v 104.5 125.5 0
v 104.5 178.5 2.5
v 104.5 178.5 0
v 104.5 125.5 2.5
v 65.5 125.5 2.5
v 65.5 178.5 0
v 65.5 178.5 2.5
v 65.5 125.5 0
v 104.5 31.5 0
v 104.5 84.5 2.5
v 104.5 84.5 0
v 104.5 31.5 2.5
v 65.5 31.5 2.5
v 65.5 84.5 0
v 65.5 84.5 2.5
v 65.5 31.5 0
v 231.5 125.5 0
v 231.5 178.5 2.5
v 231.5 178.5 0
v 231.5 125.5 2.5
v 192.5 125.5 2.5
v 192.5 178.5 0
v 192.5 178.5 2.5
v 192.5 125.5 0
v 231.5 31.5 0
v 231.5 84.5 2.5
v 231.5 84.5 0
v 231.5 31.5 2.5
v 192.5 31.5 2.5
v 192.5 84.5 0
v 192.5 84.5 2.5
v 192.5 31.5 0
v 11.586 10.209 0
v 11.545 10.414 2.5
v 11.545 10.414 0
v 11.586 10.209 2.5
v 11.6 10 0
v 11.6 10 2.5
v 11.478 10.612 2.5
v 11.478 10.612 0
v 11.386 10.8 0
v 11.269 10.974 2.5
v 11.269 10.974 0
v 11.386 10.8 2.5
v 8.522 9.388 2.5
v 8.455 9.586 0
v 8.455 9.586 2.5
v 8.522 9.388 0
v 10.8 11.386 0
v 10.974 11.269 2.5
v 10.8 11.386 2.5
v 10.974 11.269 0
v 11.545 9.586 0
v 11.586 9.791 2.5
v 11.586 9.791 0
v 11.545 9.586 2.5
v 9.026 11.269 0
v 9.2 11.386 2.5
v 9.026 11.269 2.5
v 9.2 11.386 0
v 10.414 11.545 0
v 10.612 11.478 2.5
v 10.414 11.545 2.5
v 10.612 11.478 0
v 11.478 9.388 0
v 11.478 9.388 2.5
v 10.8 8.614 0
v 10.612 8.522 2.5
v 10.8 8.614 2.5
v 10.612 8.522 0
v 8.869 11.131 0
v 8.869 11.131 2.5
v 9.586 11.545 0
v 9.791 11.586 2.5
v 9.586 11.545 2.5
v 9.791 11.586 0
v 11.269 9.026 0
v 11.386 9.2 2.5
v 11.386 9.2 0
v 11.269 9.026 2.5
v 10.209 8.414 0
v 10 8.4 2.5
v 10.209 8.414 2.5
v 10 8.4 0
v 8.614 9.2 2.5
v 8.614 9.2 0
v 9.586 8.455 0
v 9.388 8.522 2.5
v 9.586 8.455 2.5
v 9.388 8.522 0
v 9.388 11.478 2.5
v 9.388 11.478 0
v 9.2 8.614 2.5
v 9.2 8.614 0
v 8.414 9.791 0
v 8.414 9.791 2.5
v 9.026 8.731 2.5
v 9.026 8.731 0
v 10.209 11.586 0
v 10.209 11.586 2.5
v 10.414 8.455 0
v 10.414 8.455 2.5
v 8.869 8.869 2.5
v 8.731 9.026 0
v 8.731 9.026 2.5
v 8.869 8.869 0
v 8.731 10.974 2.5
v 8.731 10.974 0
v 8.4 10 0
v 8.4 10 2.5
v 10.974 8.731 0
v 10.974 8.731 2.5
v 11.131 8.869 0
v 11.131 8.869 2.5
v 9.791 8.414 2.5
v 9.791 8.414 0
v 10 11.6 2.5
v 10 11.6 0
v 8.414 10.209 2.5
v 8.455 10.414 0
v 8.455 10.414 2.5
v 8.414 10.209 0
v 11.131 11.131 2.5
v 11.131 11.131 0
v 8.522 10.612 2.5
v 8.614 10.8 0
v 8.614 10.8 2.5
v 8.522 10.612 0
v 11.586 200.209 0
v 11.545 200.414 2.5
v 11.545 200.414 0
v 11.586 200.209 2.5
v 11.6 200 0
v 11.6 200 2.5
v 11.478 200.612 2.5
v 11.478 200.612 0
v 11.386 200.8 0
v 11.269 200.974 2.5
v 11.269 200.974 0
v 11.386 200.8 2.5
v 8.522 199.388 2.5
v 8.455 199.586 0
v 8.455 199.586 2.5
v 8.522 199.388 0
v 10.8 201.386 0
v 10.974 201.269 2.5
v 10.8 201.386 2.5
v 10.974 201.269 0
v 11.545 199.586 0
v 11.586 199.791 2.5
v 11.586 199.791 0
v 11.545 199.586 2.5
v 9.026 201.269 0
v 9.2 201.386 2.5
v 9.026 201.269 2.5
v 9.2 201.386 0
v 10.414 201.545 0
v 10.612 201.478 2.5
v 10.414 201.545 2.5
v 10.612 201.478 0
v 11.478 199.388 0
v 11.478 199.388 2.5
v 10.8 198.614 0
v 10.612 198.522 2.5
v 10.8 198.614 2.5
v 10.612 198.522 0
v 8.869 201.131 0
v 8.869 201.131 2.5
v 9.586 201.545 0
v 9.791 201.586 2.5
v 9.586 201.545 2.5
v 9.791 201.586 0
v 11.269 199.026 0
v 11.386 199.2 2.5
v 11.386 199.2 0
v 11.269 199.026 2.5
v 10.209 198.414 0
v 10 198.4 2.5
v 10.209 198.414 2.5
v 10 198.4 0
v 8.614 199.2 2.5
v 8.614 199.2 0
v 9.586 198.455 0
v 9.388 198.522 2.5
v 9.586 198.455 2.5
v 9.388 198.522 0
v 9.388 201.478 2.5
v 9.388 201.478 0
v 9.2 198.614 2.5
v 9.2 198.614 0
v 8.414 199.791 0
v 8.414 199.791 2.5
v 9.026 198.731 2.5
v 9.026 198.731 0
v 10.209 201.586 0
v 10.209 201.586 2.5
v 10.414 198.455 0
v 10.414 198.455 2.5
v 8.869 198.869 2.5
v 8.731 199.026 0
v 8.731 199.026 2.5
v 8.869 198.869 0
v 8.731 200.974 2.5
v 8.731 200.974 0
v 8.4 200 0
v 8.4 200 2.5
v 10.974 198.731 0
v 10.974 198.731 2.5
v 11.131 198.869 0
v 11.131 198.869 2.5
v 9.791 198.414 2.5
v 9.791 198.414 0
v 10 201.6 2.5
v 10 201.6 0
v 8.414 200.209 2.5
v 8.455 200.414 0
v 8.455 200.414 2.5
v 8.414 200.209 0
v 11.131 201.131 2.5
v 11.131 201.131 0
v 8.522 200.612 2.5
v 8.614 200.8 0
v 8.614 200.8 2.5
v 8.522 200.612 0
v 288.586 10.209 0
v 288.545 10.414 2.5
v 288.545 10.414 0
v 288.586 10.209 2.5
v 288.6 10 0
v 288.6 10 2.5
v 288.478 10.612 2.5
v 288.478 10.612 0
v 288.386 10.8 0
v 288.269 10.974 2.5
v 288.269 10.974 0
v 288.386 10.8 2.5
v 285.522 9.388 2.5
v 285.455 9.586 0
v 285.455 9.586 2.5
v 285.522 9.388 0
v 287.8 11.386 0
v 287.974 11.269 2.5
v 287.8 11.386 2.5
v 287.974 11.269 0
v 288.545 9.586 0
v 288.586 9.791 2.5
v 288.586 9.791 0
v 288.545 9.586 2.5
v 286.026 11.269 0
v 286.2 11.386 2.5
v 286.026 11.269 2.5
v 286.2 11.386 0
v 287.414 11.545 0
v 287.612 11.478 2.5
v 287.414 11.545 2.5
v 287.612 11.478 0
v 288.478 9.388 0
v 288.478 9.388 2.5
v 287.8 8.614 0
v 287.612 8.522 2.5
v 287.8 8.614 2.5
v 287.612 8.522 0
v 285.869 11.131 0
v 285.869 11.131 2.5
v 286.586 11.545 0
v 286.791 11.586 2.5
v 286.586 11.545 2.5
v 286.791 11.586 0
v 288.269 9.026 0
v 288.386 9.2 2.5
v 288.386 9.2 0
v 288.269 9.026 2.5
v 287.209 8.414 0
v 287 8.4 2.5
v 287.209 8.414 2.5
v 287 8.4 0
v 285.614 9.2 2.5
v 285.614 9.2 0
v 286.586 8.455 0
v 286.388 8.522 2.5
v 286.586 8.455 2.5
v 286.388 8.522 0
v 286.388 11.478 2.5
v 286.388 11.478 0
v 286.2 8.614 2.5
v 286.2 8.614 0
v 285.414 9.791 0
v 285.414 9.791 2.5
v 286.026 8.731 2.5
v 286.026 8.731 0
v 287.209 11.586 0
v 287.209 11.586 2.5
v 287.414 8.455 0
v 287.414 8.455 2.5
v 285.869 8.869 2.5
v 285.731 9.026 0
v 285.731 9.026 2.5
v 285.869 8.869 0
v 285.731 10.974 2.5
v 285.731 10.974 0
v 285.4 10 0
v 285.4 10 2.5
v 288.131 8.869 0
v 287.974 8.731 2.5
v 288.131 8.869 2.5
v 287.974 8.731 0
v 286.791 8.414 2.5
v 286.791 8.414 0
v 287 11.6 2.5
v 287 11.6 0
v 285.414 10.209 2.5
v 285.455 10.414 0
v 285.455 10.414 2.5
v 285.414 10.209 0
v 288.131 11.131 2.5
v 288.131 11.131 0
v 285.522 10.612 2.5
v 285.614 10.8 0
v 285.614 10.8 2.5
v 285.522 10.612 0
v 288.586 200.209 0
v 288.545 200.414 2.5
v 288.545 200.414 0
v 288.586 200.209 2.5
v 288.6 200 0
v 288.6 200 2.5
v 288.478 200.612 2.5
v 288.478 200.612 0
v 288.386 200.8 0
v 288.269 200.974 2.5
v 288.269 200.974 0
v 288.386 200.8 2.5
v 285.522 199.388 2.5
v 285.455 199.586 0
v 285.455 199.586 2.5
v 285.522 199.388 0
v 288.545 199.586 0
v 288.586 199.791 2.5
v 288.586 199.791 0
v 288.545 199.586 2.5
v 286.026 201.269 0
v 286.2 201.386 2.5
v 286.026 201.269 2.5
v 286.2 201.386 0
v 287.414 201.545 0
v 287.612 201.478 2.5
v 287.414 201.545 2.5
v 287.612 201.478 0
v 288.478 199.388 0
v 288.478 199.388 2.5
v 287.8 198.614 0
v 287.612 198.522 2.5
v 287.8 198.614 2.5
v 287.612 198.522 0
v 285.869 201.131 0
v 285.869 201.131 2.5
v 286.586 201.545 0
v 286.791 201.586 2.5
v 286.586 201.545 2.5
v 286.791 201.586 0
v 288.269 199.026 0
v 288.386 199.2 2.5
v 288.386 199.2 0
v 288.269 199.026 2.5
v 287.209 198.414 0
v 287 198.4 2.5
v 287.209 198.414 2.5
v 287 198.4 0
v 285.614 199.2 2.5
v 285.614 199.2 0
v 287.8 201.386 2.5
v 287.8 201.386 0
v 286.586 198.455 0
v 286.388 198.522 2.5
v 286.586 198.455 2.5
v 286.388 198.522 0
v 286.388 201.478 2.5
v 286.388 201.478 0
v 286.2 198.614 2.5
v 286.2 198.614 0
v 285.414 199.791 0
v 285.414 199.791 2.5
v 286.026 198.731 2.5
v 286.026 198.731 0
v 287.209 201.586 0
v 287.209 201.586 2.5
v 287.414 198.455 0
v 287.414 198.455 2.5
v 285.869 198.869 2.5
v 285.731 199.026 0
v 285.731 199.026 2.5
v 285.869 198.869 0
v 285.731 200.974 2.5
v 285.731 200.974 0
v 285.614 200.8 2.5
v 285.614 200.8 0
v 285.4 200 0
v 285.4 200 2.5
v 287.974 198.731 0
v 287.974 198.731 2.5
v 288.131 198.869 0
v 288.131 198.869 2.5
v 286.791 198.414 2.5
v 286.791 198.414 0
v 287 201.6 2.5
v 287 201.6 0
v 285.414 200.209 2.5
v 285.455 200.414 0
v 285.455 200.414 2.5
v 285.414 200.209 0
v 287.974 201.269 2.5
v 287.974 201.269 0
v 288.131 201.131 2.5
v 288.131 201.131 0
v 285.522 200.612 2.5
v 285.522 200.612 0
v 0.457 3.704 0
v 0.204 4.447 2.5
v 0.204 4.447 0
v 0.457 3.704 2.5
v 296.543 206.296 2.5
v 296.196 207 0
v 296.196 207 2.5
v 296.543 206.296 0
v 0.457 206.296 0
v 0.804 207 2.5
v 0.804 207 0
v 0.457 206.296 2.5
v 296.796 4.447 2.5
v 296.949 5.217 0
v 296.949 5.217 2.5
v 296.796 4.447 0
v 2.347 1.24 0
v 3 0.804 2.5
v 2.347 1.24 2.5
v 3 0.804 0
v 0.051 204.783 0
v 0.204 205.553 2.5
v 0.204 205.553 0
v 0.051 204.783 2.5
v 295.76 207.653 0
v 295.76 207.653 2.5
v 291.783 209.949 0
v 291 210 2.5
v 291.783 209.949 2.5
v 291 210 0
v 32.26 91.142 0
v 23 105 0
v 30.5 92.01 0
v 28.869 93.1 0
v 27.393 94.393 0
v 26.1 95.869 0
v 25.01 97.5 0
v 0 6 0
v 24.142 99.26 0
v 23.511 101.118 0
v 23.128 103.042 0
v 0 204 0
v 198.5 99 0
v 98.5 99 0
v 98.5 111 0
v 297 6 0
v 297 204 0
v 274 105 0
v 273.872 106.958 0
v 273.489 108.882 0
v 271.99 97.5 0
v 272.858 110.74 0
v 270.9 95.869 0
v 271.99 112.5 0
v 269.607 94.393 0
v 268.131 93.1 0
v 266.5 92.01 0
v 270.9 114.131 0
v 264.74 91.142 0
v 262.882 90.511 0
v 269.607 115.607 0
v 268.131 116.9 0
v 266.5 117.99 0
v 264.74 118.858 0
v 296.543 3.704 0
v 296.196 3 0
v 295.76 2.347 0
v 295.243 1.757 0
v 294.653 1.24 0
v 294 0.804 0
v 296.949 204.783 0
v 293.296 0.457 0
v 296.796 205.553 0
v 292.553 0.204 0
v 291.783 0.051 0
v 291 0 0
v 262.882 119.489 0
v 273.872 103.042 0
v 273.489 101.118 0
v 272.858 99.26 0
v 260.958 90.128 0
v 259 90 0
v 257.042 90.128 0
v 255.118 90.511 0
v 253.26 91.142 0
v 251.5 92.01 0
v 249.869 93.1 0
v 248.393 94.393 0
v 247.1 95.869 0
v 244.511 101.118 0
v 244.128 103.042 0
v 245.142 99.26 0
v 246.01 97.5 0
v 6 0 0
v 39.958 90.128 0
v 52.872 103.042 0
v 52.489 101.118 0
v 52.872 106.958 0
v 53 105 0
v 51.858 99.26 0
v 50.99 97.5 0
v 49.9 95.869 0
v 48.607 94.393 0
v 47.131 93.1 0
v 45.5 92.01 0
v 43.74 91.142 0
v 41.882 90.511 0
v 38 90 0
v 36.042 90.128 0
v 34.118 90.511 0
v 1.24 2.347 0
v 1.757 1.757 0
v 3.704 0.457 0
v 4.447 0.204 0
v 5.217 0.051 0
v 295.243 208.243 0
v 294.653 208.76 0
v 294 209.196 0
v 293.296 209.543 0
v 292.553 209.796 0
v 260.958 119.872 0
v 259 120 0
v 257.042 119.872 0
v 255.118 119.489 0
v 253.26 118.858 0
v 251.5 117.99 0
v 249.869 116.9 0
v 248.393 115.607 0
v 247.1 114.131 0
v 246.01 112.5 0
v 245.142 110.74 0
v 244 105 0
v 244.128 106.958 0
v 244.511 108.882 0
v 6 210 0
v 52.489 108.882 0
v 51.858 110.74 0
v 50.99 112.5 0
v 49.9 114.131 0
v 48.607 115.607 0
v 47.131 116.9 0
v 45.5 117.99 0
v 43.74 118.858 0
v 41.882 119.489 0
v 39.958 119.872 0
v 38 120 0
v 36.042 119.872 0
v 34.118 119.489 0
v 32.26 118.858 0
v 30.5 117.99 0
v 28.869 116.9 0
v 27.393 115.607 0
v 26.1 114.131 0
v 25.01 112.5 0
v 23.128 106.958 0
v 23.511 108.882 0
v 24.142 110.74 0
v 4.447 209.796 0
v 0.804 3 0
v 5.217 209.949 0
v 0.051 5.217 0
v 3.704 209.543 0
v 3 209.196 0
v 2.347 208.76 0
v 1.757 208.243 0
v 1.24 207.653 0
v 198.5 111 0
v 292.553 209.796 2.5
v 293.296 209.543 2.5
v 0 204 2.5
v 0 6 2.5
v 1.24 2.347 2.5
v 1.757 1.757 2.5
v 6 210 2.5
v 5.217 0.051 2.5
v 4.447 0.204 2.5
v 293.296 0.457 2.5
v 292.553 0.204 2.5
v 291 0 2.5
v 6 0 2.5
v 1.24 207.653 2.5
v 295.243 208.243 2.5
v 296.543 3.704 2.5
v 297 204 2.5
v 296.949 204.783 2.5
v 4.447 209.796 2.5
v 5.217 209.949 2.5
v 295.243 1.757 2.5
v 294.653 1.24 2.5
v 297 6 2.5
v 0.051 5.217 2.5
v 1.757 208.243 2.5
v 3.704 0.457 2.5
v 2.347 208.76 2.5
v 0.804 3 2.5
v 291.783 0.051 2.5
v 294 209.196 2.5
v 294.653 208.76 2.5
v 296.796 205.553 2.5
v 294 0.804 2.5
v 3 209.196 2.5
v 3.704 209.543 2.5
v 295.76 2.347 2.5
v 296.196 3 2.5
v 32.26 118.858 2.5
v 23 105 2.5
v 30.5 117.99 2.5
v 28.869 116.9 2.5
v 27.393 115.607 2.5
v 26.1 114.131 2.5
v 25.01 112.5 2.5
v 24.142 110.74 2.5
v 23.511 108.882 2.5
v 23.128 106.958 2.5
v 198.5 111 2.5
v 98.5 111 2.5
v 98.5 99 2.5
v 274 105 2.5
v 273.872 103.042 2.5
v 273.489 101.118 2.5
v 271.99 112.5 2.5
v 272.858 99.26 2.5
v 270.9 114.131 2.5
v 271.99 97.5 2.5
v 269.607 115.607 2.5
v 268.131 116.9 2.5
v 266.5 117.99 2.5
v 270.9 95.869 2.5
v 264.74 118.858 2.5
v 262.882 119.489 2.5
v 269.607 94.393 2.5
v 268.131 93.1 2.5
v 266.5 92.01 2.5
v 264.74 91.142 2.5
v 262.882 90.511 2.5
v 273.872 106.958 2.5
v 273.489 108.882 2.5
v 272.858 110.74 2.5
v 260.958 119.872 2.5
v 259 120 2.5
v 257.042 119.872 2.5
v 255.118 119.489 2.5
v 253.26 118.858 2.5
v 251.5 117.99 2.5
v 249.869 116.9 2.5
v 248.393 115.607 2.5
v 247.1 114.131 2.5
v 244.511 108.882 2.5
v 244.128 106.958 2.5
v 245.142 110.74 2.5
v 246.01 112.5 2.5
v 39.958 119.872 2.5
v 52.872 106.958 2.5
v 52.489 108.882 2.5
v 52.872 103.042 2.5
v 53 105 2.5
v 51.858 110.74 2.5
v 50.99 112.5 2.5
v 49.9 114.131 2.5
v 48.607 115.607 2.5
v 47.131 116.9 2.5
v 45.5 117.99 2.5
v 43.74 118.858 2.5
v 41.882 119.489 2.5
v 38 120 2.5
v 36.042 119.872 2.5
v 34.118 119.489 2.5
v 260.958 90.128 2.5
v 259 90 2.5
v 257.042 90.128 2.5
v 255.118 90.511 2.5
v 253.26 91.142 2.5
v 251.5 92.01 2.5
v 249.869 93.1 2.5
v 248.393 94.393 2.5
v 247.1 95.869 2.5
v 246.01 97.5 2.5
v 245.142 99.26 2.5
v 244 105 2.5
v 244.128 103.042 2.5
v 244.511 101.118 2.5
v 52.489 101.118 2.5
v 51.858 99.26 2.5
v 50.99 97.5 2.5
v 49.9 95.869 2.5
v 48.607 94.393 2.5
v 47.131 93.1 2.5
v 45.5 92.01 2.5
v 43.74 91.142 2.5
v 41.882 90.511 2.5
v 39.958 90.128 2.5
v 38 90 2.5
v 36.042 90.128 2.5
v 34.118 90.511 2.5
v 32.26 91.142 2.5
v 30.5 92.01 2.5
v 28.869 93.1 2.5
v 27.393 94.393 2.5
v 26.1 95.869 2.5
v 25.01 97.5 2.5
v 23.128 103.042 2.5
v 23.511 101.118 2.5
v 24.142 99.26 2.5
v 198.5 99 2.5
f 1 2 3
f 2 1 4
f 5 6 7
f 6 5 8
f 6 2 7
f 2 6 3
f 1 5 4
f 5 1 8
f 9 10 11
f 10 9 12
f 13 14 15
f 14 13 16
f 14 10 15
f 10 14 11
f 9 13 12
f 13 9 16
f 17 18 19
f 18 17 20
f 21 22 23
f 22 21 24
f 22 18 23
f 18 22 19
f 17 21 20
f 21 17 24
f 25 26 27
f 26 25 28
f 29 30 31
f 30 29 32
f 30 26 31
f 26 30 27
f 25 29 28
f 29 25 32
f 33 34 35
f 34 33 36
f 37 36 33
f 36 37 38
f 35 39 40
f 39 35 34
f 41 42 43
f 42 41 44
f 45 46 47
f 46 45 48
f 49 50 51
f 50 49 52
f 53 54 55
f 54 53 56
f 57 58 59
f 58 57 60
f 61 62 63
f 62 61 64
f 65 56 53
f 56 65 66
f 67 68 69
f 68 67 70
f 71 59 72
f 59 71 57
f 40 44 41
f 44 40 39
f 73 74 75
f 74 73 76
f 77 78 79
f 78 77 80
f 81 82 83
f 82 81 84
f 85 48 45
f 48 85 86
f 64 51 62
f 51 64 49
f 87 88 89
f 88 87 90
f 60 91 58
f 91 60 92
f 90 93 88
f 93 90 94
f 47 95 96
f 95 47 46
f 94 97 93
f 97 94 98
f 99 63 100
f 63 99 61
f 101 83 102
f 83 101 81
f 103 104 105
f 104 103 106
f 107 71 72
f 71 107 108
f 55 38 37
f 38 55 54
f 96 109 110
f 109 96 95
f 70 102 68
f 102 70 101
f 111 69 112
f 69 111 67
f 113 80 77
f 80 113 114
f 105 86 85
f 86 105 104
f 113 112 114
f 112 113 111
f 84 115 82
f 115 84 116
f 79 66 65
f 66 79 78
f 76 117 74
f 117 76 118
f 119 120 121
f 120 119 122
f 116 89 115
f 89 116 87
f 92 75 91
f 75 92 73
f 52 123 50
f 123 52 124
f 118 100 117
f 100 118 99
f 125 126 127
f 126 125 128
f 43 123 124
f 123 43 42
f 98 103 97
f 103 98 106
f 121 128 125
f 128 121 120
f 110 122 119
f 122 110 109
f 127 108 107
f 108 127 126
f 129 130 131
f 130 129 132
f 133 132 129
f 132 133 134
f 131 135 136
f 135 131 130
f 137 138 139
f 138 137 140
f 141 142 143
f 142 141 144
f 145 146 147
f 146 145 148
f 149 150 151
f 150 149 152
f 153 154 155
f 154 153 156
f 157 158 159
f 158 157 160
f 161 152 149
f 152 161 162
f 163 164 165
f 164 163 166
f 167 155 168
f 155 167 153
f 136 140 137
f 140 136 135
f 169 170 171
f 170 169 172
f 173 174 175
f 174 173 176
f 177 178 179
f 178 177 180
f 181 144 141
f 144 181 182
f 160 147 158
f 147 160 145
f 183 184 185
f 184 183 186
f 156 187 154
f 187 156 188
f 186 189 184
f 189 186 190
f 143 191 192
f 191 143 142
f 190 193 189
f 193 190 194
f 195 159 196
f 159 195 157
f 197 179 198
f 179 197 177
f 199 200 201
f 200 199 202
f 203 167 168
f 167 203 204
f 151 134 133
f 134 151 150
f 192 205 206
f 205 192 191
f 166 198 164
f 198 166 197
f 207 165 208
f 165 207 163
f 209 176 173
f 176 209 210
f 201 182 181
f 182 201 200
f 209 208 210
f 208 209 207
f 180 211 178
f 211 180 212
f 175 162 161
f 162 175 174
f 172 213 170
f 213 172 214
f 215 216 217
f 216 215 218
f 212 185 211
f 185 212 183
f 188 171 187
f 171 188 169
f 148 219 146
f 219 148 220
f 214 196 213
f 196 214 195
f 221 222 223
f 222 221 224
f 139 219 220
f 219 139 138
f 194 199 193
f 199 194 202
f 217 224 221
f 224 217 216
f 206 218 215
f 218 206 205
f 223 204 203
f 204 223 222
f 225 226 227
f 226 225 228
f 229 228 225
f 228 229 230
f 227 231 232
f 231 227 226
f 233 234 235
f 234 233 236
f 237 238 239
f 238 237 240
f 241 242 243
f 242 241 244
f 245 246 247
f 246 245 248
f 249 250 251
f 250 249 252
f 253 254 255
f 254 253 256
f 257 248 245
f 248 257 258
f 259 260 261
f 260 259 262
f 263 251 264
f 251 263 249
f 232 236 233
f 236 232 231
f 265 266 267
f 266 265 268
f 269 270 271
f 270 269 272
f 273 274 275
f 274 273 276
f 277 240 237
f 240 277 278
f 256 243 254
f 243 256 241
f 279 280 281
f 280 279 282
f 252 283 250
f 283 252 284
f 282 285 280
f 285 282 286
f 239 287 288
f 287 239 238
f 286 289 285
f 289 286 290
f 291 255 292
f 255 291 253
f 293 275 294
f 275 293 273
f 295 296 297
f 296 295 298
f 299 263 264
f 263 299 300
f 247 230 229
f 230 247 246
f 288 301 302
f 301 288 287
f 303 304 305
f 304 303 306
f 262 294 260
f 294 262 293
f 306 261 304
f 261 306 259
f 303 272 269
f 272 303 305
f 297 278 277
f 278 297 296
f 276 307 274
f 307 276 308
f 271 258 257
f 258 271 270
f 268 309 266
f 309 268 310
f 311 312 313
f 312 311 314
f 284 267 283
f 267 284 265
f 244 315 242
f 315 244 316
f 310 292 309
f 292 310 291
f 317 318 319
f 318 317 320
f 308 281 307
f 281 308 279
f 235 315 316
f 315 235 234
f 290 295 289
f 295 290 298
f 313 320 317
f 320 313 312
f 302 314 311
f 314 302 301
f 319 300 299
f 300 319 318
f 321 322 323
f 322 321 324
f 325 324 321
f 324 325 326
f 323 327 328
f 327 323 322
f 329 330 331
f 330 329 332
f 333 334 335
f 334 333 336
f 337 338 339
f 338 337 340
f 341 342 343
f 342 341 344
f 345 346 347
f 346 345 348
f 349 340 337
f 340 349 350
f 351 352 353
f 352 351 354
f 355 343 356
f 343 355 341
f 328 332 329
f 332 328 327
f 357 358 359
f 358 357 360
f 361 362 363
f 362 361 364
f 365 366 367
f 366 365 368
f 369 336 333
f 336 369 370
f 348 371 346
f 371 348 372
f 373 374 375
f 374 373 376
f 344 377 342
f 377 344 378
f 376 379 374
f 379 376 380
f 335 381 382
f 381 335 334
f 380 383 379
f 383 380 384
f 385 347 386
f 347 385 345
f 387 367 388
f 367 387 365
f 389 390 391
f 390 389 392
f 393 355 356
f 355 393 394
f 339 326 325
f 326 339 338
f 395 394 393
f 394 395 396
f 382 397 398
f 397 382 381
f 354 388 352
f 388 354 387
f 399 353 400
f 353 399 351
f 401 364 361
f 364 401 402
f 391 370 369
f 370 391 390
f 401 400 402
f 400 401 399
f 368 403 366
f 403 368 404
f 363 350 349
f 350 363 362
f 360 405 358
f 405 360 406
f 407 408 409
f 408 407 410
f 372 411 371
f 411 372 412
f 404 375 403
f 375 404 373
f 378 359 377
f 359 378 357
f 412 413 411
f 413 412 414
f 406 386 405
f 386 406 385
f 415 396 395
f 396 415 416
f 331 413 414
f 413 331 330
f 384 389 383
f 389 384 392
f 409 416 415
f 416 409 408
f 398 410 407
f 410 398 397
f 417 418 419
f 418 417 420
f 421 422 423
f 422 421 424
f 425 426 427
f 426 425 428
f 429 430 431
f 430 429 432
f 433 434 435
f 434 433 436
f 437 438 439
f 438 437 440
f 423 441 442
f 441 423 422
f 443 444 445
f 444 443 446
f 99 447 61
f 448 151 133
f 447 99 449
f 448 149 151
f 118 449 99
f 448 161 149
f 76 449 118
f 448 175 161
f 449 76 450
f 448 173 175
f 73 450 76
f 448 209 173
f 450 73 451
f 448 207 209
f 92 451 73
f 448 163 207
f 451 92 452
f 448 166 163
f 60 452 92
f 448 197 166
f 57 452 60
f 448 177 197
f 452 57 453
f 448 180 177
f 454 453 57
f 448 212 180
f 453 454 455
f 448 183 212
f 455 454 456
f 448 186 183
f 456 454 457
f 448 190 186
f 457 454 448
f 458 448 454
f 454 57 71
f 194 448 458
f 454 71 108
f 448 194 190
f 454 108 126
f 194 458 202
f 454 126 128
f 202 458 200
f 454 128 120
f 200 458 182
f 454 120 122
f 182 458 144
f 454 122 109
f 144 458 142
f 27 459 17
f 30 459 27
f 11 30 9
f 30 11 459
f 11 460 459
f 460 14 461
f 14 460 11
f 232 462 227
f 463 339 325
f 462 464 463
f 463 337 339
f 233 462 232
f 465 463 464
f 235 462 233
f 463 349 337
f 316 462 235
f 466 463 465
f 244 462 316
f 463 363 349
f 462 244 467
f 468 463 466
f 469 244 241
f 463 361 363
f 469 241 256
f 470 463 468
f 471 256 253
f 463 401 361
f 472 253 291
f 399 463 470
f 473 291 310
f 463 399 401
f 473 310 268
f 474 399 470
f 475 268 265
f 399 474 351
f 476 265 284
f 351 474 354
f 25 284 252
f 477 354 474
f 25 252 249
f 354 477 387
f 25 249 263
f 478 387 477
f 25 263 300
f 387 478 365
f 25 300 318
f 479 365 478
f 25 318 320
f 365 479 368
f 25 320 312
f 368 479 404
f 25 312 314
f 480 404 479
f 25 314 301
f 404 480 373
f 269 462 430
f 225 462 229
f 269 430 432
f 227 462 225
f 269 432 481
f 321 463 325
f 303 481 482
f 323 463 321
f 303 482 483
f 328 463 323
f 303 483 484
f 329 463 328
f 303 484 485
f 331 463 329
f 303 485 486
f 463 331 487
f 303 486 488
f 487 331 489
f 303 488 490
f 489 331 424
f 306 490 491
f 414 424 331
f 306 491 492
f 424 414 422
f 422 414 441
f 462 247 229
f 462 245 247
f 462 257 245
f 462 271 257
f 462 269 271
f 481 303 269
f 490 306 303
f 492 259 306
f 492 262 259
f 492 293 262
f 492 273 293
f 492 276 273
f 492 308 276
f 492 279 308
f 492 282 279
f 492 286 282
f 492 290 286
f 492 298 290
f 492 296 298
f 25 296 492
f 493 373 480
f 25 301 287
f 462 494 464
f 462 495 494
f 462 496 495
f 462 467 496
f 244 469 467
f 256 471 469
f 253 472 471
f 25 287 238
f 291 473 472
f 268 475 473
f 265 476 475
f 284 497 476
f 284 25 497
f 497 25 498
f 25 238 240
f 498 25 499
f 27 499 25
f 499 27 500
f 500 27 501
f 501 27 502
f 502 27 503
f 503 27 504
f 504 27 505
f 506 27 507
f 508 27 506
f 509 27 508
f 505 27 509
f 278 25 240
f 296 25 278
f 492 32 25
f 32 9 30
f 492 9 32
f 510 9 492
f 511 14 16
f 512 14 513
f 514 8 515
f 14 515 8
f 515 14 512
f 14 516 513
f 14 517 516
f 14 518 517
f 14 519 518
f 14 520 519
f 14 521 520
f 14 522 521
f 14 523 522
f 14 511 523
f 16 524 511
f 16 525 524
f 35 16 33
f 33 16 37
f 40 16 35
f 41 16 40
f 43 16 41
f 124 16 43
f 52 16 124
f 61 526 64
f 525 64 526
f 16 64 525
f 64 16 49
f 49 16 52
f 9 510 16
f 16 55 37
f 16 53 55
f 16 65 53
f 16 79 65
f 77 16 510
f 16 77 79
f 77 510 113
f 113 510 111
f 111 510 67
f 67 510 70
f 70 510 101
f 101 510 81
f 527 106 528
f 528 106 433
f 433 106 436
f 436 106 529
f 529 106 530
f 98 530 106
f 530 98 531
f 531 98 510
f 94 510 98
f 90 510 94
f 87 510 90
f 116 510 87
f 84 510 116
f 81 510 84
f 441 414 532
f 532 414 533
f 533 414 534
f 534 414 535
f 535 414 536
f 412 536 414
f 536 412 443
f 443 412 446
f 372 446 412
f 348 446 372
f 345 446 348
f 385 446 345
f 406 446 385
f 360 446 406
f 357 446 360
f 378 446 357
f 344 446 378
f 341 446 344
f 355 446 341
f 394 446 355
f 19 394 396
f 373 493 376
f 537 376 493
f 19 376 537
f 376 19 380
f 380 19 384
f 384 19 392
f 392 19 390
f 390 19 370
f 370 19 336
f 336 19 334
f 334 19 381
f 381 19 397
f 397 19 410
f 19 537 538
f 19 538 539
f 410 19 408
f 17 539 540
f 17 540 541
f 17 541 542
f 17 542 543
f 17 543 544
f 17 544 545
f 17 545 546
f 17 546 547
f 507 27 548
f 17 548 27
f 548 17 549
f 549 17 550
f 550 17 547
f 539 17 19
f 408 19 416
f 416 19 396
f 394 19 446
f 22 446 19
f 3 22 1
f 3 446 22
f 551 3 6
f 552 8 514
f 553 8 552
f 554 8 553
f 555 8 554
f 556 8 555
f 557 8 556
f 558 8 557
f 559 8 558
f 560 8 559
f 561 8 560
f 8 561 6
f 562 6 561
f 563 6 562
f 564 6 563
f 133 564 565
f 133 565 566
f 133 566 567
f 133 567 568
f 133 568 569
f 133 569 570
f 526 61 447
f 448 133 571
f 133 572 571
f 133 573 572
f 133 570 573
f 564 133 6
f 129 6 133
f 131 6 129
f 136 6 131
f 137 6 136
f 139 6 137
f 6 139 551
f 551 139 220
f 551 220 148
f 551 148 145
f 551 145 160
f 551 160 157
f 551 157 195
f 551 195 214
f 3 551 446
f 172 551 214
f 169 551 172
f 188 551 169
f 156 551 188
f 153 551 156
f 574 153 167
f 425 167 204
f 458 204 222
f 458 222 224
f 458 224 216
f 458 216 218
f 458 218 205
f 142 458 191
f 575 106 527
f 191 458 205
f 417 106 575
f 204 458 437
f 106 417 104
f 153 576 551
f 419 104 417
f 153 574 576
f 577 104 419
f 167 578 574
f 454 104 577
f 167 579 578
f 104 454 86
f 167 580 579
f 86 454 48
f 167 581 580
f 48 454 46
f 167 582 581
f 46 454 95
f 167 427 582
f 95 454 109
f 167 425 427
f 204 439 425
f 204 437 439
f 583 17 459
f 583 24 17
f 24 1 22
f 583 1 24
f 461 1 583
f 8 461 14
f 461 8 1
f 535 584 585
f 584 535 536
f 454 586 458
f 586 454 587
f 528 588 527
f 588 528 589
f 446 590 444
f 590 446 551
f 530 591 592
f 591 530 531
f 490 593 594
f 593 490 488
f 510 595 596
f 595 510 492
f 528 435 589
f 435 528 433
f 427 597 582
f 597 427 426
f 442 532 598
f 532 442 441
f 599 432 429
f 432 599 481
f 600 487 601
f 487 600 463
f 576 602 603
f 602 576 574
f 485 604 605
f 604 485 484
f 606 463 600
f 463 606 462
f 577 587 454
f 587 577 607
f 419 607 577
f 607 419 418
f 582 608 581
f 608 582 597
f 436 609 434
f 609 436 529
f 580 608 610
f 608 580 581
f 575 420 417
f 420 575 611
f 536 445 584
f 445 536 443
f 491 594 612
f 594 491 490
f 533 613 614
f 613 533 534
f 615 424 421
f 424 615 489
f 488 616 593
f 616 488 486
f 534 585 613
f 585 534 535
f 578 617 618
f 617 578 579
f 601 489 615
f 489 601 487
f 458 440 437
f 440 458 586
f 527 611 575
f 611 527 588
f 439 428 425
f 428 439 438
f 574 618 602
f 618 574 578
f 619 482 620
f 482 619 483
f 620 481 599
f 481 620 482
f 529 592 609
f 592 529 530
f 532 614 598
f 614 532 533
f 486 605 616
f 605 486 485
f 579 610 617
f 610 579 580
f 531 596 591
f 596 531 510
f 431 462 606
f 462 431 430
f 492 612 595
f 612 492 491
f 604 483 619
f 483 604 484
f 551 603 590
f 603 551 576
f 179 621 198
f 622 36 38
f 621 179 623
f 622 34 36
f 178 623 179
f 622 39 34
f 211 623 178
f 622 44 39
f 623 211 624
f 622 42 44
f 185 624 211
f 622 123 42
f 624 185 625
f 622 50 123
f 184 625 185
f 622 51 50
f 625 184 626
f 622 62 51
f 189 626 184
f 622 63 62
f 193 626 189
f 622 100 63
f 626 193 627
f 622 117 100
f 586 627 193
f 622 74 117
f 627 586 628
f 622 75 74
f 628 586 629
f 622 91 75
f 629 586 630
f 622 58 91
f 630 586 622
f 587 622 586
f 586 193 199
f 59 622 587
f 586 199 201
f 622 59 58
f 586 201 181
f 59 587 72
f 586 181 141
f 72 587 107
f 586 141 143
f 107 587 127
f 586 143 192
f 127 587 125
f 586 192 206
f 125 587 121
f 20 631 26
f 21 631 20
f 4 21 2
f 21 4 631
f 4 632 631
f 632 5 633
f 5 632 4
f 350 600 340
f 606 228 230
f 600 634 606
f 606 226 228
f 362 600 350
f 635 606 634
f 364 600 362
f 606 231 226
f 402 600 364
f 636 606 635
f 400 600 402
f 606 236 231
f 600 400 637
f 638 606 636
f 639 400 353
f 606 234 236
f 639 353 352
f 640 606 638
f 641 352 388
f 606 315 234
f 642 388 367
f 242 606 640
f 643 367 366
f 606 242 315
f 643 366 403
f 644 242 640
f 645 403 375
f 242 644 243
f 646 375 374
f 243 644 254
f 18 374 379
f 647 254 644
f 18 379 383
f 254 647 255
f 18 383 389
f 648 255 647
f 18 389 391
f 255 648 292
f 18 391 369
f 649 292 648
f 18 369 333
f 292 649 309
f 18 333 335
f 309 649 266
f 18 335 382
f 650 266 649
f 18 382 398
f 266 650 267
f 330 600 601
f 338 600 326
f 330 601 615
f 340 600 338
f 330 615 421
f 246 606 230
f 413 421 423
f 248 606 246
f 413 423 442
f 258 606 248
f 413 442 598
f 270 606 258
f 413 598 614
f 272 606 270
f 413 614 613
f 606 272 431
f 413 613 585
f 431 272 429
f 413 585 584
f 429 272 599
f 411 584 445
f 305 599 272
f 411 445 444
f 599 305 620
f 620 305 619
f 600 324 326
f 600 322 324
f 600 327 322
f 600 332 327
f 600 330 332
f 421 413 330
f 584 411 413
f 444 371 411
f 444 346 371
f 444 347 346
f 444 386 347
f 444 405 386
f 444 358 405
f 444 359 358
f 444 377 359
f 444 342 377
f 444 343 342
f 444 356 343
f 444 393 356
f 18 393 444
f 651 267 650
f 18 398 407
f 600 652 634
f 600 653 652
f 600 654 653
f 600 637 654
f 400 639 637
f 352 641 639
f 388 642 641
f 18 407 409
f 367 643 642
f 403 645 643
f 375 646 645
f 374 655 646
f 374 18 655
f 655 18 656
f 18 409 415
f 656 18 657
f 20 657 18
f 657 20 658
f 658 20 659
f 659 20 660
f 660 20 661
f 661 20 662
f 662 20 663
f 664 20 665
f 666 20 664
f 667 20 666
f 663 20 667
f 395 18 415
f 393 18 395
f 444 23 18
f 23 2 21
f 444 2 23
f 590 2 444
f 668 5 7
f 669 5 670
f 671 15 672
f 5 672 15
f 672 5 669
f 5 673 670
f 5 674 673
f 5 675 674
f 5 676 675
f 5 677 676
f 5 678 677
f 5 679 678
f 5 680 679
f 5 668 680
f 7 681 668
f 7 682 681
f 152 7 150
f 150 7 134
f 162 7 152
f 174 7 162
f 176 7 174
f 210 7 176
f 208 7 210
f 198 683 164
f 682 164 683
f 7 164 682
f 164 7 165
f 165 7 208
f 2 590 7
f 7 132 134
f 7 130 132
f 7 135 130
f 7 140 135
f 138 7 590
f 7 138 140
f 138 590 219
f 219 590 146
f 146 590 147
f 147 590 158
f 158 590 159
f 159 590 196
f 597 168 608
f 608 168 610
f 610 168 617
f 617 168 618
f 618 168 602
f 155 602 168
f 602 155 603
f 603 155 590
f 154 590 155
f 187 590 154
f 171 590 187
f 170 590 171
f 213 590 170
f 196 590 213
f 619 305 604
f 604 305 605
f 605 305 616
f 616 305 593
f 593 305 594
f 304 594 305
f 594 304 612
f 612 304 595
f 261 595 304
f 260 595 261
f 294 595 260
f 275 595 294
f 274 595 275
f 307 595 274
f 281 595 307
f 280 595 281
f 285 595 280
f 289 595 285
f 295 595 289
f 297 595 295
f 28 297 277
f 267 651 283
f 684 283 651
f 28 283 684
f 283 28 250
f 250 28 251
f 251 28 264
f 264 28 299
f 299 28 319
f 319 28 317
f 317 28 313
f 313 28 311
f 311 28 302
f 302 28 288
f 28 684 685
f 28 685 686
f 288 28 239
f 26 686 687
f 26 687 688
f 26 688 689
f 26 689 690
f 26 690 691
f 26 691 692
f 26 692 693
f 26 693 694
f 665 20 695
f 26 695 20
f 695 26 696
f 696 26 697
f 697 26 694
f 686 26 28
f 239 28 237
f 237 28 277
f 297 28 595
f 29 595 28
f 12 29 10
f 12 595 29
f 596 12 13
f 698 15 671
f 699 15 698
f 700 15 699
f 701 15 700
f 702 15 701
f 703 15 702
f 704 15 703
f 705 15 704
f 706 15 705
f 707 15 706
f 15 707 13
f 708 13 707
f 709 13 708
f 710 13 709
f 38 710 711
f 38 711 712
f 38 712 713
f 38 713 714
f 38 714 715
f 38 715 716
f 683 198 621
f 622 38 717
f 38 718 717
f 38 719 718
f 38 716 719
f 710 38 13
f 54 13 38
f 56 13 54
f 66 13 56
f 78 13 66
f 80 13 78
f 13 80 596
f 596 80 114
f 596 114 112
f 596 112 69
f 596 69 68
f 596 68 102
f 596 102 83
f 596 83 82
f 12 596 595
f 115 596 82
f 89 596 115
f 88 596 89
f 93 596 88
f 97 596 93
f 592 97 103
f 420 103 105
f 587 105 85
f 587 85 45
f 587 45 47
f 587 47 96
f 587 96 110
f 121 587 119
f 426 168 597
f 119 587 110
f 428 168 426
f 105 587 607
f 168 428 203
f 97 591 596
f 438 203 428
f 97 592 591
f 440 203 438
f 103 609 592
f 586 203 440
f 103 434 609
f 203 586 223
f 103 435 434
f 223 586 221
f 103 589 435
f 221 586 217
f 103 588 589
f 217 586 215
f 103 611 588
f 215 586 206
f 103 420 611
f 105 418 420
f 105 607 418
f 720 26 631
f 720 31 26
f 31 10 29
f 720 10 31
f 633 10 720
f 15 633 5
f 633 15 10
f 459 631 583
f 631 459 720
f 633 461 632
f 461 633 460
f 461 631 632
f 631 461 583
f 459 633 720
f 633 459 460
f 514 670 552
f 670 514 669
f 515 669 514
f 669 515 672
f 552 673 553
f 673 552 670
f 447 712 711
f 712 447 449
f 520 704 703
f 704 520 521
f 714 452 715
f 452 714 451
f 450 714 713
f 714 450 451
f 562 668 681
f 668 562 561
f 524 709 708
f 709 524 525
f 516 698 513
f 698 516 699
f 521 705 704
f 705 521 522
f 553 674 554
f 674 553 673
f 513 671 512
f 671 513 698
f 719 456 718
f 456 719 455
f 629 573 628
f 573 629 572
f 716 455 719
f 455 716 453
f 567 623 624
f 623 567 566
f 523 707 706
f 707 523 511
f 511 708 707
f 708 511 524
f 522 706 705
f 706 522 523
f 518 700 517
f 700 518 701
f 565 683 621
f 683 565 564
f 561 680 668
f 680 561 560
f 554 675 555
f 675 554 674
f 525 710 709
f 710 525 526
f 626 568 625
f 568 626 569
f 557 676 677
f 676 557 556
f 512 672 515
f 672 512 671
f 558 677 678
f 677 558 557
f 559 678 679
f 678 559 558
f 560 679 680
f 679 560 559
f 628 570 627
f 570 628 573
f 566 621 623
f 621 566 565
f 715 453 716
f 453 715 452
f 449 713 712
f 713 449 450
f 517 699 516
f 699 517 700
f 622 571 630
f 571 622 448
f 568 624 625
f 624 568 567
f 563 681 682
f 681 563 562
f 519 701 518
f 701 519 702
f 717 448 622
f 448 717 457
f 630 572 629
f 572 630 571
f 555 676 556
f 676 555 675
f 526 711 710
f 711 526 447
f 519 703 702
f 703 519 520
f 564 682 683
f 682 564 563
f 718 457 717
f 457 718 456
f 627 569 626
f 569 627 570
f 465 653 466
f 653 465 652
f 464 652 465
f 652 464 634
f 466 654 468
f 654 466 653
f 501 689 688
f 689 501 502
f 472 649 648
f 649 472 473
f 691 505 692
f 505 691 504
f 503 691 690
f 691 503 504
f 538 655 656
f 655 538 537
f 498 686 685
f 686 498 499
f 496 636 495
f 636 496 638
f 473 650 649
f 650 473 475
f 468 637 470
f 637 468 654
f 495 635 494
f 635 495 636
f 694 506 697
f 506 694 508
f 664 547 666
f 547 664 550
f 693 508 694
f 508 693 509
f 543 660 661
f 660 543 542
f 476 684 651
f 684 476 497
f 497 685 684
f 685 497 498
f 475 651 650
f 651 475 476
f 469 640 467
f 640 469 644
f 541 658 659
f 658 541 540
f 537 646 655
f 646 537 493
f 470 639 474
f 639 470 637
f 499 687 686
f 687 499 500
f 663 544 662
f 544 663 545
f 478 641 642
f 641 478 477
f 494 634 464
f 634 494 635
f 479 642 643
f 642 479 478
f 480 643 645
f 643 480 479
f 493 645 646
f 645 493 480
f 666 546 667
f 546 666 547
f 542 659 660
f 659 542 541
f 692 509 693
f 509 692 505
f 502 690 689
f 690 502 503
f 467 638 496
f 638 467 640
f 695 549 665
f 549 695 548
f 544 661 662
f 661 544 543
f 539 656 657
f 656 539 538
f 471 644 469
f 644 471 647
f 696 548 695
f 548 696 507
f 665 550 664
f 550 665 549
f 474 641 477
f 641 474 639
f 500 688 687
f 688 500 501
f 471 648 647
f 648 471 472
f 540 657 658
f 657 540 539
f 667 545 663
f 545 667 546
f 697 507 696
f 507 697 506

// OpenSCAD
// ============================================================================
// Smart A4 Scoreboard - Enclosure  LAYOUT B  (stacked / 2x2)
// ----------------------------------------------------------------------------
// Alternative to Layout A (single row of 4). Here the 4 screens are stacked
// up-and-down in two player columns, with the LED strip running HORIZONTALLY
// in the gap between the upper and lower screens. USB-C charge port on the side.
//
//   [A initials]            [B initials]      <- upper row
//   ===========  LED strip  ===========       <- horizontal strip, centre
//   [A score]               [B score]         <- lower row
//
// Render the two parts separately for printing:
//   PART = "tray";       // F6 -> export STL
//   PART = "faceplate";  // F6 -> export STL
//
// Author: Rohit Jangra. Units = millimetres.
// ============================================================================

PART = "faceplate";   // "tray" | "faceplate" | "preview"

// ---- A4 footprint ----------------------------------------------------------
A4_W = 297;  A4_H = 210;
WALL = 2.4;  FLOOR = 2.0;  FACE = 2.5;  CAVITY_H = 22;  CORNER_R = 6;

// ---- 2.4" ILI9341 module ---------------------------------------------------
DISP_WIN_W = 39;  DISP_WIN_H = 53;

// ---- column / row centres --------------------------------------------------
COL_L = 85;   COL_R = A4_W - 85;        // two player columns (symmetric)
ROW_T = 152;  ROW_B = 58;               // upper / lower screen centres

// ---- horizontal LED strip (centre band) ------------------------------------
LED_W = 100;  LED_H = 12;               // long axis horizontal

// ---- inputs ----------------------------------------------------------------
BTN_D = 30;                              // 30mm arcade buttons, on the wings
BTN_X_L = 38;  BTN_X_R = A4_W - 38;  BTN_Y = A4_H/2;
USB_W = 12;  USB_H = 7;

// ---- mounting --------------------------------------------------------------
POST_D = 7;  SCREW_D = 3.2;  INSET = 10;
$fn = 48;

module rrect(w, h, r) { hull() for (x=[r,w-r], y=[r,h-r]) translate([x,y]) circle(r); }

module tray() {
    difference() {
        union() {
            linear_extrude(FLOOR) rrect(A4_W, A4_H, CORNER_R);
            linear_extrude(CAVITY_H) difference() {
                rrect(A4_W, A4_H, CORNER_R);
                offset(-WALL) rrect(A4_W, A4_H, CORNER_R);
            }
            for (x=[INSET, A4_W-INSET], y=[INSET, A4_H-INSET])
                translate([x,y,0]) cylinder(d=POST_D, h=CAVITY_H);
        }
        for (x=[INSET, A4_W-INSET], y=[INSET, A4_H-INSET])
            translate([x,y,FLOOR]) cylinder(d=SCREW_D, h=CAVITY_H);
        translate([A4_W-WALL-1, A4_H/2-USB_W/2, FLOOR+4]) cube([WALL+2, USB_W, USB_H]);
    }
}

module faceplate() {
    cols = [COL_L, COL_R];
    rows = [ROW_T, ROW_B];
    difference() {
        linear_extrude(FACE) rrect(A4_W, A4_H, CORNER_R);
        // 4 display windows (2 columns x 2 rows)
        for (x=cols, y=rows)
            translate([x-DISP_WIN_W/2, y-DISP_WIN_H/2, -1])
                cube([DISP_WIN_W, DISP_WIN_H, FACE+2]);
        // horizontal LED strip, centre band
        translate([A4_W/2-LED_W/2, A4_H/2-LED_H/2, -1])
            cube([LED_W, LED_H, FACE+2]);
        // two arcade buttons on the wings
        translate([BTN_X_L, BTN_Y, -1]) cylinder(d=BTN_D, h=FACE+2);
        translate([BTN_X_R, BTN_Y, -1]) cylinder(d=BTN_D, h=FACE+2);
        // screw holes
        for (x=[INSET, A4_W-INSET], y=[INSET, A4_H-INSET])
            translate([x,y,-1]) cylinder(d=SCREW_D, h=FACE+2);
    }
}

if (PART == "tray")           tray();
else if (PART == "faceplate") faceplate();
else { tray(); translate([0,0,CAVITY_H+8]) color("LightGrey") faceplate(); }
